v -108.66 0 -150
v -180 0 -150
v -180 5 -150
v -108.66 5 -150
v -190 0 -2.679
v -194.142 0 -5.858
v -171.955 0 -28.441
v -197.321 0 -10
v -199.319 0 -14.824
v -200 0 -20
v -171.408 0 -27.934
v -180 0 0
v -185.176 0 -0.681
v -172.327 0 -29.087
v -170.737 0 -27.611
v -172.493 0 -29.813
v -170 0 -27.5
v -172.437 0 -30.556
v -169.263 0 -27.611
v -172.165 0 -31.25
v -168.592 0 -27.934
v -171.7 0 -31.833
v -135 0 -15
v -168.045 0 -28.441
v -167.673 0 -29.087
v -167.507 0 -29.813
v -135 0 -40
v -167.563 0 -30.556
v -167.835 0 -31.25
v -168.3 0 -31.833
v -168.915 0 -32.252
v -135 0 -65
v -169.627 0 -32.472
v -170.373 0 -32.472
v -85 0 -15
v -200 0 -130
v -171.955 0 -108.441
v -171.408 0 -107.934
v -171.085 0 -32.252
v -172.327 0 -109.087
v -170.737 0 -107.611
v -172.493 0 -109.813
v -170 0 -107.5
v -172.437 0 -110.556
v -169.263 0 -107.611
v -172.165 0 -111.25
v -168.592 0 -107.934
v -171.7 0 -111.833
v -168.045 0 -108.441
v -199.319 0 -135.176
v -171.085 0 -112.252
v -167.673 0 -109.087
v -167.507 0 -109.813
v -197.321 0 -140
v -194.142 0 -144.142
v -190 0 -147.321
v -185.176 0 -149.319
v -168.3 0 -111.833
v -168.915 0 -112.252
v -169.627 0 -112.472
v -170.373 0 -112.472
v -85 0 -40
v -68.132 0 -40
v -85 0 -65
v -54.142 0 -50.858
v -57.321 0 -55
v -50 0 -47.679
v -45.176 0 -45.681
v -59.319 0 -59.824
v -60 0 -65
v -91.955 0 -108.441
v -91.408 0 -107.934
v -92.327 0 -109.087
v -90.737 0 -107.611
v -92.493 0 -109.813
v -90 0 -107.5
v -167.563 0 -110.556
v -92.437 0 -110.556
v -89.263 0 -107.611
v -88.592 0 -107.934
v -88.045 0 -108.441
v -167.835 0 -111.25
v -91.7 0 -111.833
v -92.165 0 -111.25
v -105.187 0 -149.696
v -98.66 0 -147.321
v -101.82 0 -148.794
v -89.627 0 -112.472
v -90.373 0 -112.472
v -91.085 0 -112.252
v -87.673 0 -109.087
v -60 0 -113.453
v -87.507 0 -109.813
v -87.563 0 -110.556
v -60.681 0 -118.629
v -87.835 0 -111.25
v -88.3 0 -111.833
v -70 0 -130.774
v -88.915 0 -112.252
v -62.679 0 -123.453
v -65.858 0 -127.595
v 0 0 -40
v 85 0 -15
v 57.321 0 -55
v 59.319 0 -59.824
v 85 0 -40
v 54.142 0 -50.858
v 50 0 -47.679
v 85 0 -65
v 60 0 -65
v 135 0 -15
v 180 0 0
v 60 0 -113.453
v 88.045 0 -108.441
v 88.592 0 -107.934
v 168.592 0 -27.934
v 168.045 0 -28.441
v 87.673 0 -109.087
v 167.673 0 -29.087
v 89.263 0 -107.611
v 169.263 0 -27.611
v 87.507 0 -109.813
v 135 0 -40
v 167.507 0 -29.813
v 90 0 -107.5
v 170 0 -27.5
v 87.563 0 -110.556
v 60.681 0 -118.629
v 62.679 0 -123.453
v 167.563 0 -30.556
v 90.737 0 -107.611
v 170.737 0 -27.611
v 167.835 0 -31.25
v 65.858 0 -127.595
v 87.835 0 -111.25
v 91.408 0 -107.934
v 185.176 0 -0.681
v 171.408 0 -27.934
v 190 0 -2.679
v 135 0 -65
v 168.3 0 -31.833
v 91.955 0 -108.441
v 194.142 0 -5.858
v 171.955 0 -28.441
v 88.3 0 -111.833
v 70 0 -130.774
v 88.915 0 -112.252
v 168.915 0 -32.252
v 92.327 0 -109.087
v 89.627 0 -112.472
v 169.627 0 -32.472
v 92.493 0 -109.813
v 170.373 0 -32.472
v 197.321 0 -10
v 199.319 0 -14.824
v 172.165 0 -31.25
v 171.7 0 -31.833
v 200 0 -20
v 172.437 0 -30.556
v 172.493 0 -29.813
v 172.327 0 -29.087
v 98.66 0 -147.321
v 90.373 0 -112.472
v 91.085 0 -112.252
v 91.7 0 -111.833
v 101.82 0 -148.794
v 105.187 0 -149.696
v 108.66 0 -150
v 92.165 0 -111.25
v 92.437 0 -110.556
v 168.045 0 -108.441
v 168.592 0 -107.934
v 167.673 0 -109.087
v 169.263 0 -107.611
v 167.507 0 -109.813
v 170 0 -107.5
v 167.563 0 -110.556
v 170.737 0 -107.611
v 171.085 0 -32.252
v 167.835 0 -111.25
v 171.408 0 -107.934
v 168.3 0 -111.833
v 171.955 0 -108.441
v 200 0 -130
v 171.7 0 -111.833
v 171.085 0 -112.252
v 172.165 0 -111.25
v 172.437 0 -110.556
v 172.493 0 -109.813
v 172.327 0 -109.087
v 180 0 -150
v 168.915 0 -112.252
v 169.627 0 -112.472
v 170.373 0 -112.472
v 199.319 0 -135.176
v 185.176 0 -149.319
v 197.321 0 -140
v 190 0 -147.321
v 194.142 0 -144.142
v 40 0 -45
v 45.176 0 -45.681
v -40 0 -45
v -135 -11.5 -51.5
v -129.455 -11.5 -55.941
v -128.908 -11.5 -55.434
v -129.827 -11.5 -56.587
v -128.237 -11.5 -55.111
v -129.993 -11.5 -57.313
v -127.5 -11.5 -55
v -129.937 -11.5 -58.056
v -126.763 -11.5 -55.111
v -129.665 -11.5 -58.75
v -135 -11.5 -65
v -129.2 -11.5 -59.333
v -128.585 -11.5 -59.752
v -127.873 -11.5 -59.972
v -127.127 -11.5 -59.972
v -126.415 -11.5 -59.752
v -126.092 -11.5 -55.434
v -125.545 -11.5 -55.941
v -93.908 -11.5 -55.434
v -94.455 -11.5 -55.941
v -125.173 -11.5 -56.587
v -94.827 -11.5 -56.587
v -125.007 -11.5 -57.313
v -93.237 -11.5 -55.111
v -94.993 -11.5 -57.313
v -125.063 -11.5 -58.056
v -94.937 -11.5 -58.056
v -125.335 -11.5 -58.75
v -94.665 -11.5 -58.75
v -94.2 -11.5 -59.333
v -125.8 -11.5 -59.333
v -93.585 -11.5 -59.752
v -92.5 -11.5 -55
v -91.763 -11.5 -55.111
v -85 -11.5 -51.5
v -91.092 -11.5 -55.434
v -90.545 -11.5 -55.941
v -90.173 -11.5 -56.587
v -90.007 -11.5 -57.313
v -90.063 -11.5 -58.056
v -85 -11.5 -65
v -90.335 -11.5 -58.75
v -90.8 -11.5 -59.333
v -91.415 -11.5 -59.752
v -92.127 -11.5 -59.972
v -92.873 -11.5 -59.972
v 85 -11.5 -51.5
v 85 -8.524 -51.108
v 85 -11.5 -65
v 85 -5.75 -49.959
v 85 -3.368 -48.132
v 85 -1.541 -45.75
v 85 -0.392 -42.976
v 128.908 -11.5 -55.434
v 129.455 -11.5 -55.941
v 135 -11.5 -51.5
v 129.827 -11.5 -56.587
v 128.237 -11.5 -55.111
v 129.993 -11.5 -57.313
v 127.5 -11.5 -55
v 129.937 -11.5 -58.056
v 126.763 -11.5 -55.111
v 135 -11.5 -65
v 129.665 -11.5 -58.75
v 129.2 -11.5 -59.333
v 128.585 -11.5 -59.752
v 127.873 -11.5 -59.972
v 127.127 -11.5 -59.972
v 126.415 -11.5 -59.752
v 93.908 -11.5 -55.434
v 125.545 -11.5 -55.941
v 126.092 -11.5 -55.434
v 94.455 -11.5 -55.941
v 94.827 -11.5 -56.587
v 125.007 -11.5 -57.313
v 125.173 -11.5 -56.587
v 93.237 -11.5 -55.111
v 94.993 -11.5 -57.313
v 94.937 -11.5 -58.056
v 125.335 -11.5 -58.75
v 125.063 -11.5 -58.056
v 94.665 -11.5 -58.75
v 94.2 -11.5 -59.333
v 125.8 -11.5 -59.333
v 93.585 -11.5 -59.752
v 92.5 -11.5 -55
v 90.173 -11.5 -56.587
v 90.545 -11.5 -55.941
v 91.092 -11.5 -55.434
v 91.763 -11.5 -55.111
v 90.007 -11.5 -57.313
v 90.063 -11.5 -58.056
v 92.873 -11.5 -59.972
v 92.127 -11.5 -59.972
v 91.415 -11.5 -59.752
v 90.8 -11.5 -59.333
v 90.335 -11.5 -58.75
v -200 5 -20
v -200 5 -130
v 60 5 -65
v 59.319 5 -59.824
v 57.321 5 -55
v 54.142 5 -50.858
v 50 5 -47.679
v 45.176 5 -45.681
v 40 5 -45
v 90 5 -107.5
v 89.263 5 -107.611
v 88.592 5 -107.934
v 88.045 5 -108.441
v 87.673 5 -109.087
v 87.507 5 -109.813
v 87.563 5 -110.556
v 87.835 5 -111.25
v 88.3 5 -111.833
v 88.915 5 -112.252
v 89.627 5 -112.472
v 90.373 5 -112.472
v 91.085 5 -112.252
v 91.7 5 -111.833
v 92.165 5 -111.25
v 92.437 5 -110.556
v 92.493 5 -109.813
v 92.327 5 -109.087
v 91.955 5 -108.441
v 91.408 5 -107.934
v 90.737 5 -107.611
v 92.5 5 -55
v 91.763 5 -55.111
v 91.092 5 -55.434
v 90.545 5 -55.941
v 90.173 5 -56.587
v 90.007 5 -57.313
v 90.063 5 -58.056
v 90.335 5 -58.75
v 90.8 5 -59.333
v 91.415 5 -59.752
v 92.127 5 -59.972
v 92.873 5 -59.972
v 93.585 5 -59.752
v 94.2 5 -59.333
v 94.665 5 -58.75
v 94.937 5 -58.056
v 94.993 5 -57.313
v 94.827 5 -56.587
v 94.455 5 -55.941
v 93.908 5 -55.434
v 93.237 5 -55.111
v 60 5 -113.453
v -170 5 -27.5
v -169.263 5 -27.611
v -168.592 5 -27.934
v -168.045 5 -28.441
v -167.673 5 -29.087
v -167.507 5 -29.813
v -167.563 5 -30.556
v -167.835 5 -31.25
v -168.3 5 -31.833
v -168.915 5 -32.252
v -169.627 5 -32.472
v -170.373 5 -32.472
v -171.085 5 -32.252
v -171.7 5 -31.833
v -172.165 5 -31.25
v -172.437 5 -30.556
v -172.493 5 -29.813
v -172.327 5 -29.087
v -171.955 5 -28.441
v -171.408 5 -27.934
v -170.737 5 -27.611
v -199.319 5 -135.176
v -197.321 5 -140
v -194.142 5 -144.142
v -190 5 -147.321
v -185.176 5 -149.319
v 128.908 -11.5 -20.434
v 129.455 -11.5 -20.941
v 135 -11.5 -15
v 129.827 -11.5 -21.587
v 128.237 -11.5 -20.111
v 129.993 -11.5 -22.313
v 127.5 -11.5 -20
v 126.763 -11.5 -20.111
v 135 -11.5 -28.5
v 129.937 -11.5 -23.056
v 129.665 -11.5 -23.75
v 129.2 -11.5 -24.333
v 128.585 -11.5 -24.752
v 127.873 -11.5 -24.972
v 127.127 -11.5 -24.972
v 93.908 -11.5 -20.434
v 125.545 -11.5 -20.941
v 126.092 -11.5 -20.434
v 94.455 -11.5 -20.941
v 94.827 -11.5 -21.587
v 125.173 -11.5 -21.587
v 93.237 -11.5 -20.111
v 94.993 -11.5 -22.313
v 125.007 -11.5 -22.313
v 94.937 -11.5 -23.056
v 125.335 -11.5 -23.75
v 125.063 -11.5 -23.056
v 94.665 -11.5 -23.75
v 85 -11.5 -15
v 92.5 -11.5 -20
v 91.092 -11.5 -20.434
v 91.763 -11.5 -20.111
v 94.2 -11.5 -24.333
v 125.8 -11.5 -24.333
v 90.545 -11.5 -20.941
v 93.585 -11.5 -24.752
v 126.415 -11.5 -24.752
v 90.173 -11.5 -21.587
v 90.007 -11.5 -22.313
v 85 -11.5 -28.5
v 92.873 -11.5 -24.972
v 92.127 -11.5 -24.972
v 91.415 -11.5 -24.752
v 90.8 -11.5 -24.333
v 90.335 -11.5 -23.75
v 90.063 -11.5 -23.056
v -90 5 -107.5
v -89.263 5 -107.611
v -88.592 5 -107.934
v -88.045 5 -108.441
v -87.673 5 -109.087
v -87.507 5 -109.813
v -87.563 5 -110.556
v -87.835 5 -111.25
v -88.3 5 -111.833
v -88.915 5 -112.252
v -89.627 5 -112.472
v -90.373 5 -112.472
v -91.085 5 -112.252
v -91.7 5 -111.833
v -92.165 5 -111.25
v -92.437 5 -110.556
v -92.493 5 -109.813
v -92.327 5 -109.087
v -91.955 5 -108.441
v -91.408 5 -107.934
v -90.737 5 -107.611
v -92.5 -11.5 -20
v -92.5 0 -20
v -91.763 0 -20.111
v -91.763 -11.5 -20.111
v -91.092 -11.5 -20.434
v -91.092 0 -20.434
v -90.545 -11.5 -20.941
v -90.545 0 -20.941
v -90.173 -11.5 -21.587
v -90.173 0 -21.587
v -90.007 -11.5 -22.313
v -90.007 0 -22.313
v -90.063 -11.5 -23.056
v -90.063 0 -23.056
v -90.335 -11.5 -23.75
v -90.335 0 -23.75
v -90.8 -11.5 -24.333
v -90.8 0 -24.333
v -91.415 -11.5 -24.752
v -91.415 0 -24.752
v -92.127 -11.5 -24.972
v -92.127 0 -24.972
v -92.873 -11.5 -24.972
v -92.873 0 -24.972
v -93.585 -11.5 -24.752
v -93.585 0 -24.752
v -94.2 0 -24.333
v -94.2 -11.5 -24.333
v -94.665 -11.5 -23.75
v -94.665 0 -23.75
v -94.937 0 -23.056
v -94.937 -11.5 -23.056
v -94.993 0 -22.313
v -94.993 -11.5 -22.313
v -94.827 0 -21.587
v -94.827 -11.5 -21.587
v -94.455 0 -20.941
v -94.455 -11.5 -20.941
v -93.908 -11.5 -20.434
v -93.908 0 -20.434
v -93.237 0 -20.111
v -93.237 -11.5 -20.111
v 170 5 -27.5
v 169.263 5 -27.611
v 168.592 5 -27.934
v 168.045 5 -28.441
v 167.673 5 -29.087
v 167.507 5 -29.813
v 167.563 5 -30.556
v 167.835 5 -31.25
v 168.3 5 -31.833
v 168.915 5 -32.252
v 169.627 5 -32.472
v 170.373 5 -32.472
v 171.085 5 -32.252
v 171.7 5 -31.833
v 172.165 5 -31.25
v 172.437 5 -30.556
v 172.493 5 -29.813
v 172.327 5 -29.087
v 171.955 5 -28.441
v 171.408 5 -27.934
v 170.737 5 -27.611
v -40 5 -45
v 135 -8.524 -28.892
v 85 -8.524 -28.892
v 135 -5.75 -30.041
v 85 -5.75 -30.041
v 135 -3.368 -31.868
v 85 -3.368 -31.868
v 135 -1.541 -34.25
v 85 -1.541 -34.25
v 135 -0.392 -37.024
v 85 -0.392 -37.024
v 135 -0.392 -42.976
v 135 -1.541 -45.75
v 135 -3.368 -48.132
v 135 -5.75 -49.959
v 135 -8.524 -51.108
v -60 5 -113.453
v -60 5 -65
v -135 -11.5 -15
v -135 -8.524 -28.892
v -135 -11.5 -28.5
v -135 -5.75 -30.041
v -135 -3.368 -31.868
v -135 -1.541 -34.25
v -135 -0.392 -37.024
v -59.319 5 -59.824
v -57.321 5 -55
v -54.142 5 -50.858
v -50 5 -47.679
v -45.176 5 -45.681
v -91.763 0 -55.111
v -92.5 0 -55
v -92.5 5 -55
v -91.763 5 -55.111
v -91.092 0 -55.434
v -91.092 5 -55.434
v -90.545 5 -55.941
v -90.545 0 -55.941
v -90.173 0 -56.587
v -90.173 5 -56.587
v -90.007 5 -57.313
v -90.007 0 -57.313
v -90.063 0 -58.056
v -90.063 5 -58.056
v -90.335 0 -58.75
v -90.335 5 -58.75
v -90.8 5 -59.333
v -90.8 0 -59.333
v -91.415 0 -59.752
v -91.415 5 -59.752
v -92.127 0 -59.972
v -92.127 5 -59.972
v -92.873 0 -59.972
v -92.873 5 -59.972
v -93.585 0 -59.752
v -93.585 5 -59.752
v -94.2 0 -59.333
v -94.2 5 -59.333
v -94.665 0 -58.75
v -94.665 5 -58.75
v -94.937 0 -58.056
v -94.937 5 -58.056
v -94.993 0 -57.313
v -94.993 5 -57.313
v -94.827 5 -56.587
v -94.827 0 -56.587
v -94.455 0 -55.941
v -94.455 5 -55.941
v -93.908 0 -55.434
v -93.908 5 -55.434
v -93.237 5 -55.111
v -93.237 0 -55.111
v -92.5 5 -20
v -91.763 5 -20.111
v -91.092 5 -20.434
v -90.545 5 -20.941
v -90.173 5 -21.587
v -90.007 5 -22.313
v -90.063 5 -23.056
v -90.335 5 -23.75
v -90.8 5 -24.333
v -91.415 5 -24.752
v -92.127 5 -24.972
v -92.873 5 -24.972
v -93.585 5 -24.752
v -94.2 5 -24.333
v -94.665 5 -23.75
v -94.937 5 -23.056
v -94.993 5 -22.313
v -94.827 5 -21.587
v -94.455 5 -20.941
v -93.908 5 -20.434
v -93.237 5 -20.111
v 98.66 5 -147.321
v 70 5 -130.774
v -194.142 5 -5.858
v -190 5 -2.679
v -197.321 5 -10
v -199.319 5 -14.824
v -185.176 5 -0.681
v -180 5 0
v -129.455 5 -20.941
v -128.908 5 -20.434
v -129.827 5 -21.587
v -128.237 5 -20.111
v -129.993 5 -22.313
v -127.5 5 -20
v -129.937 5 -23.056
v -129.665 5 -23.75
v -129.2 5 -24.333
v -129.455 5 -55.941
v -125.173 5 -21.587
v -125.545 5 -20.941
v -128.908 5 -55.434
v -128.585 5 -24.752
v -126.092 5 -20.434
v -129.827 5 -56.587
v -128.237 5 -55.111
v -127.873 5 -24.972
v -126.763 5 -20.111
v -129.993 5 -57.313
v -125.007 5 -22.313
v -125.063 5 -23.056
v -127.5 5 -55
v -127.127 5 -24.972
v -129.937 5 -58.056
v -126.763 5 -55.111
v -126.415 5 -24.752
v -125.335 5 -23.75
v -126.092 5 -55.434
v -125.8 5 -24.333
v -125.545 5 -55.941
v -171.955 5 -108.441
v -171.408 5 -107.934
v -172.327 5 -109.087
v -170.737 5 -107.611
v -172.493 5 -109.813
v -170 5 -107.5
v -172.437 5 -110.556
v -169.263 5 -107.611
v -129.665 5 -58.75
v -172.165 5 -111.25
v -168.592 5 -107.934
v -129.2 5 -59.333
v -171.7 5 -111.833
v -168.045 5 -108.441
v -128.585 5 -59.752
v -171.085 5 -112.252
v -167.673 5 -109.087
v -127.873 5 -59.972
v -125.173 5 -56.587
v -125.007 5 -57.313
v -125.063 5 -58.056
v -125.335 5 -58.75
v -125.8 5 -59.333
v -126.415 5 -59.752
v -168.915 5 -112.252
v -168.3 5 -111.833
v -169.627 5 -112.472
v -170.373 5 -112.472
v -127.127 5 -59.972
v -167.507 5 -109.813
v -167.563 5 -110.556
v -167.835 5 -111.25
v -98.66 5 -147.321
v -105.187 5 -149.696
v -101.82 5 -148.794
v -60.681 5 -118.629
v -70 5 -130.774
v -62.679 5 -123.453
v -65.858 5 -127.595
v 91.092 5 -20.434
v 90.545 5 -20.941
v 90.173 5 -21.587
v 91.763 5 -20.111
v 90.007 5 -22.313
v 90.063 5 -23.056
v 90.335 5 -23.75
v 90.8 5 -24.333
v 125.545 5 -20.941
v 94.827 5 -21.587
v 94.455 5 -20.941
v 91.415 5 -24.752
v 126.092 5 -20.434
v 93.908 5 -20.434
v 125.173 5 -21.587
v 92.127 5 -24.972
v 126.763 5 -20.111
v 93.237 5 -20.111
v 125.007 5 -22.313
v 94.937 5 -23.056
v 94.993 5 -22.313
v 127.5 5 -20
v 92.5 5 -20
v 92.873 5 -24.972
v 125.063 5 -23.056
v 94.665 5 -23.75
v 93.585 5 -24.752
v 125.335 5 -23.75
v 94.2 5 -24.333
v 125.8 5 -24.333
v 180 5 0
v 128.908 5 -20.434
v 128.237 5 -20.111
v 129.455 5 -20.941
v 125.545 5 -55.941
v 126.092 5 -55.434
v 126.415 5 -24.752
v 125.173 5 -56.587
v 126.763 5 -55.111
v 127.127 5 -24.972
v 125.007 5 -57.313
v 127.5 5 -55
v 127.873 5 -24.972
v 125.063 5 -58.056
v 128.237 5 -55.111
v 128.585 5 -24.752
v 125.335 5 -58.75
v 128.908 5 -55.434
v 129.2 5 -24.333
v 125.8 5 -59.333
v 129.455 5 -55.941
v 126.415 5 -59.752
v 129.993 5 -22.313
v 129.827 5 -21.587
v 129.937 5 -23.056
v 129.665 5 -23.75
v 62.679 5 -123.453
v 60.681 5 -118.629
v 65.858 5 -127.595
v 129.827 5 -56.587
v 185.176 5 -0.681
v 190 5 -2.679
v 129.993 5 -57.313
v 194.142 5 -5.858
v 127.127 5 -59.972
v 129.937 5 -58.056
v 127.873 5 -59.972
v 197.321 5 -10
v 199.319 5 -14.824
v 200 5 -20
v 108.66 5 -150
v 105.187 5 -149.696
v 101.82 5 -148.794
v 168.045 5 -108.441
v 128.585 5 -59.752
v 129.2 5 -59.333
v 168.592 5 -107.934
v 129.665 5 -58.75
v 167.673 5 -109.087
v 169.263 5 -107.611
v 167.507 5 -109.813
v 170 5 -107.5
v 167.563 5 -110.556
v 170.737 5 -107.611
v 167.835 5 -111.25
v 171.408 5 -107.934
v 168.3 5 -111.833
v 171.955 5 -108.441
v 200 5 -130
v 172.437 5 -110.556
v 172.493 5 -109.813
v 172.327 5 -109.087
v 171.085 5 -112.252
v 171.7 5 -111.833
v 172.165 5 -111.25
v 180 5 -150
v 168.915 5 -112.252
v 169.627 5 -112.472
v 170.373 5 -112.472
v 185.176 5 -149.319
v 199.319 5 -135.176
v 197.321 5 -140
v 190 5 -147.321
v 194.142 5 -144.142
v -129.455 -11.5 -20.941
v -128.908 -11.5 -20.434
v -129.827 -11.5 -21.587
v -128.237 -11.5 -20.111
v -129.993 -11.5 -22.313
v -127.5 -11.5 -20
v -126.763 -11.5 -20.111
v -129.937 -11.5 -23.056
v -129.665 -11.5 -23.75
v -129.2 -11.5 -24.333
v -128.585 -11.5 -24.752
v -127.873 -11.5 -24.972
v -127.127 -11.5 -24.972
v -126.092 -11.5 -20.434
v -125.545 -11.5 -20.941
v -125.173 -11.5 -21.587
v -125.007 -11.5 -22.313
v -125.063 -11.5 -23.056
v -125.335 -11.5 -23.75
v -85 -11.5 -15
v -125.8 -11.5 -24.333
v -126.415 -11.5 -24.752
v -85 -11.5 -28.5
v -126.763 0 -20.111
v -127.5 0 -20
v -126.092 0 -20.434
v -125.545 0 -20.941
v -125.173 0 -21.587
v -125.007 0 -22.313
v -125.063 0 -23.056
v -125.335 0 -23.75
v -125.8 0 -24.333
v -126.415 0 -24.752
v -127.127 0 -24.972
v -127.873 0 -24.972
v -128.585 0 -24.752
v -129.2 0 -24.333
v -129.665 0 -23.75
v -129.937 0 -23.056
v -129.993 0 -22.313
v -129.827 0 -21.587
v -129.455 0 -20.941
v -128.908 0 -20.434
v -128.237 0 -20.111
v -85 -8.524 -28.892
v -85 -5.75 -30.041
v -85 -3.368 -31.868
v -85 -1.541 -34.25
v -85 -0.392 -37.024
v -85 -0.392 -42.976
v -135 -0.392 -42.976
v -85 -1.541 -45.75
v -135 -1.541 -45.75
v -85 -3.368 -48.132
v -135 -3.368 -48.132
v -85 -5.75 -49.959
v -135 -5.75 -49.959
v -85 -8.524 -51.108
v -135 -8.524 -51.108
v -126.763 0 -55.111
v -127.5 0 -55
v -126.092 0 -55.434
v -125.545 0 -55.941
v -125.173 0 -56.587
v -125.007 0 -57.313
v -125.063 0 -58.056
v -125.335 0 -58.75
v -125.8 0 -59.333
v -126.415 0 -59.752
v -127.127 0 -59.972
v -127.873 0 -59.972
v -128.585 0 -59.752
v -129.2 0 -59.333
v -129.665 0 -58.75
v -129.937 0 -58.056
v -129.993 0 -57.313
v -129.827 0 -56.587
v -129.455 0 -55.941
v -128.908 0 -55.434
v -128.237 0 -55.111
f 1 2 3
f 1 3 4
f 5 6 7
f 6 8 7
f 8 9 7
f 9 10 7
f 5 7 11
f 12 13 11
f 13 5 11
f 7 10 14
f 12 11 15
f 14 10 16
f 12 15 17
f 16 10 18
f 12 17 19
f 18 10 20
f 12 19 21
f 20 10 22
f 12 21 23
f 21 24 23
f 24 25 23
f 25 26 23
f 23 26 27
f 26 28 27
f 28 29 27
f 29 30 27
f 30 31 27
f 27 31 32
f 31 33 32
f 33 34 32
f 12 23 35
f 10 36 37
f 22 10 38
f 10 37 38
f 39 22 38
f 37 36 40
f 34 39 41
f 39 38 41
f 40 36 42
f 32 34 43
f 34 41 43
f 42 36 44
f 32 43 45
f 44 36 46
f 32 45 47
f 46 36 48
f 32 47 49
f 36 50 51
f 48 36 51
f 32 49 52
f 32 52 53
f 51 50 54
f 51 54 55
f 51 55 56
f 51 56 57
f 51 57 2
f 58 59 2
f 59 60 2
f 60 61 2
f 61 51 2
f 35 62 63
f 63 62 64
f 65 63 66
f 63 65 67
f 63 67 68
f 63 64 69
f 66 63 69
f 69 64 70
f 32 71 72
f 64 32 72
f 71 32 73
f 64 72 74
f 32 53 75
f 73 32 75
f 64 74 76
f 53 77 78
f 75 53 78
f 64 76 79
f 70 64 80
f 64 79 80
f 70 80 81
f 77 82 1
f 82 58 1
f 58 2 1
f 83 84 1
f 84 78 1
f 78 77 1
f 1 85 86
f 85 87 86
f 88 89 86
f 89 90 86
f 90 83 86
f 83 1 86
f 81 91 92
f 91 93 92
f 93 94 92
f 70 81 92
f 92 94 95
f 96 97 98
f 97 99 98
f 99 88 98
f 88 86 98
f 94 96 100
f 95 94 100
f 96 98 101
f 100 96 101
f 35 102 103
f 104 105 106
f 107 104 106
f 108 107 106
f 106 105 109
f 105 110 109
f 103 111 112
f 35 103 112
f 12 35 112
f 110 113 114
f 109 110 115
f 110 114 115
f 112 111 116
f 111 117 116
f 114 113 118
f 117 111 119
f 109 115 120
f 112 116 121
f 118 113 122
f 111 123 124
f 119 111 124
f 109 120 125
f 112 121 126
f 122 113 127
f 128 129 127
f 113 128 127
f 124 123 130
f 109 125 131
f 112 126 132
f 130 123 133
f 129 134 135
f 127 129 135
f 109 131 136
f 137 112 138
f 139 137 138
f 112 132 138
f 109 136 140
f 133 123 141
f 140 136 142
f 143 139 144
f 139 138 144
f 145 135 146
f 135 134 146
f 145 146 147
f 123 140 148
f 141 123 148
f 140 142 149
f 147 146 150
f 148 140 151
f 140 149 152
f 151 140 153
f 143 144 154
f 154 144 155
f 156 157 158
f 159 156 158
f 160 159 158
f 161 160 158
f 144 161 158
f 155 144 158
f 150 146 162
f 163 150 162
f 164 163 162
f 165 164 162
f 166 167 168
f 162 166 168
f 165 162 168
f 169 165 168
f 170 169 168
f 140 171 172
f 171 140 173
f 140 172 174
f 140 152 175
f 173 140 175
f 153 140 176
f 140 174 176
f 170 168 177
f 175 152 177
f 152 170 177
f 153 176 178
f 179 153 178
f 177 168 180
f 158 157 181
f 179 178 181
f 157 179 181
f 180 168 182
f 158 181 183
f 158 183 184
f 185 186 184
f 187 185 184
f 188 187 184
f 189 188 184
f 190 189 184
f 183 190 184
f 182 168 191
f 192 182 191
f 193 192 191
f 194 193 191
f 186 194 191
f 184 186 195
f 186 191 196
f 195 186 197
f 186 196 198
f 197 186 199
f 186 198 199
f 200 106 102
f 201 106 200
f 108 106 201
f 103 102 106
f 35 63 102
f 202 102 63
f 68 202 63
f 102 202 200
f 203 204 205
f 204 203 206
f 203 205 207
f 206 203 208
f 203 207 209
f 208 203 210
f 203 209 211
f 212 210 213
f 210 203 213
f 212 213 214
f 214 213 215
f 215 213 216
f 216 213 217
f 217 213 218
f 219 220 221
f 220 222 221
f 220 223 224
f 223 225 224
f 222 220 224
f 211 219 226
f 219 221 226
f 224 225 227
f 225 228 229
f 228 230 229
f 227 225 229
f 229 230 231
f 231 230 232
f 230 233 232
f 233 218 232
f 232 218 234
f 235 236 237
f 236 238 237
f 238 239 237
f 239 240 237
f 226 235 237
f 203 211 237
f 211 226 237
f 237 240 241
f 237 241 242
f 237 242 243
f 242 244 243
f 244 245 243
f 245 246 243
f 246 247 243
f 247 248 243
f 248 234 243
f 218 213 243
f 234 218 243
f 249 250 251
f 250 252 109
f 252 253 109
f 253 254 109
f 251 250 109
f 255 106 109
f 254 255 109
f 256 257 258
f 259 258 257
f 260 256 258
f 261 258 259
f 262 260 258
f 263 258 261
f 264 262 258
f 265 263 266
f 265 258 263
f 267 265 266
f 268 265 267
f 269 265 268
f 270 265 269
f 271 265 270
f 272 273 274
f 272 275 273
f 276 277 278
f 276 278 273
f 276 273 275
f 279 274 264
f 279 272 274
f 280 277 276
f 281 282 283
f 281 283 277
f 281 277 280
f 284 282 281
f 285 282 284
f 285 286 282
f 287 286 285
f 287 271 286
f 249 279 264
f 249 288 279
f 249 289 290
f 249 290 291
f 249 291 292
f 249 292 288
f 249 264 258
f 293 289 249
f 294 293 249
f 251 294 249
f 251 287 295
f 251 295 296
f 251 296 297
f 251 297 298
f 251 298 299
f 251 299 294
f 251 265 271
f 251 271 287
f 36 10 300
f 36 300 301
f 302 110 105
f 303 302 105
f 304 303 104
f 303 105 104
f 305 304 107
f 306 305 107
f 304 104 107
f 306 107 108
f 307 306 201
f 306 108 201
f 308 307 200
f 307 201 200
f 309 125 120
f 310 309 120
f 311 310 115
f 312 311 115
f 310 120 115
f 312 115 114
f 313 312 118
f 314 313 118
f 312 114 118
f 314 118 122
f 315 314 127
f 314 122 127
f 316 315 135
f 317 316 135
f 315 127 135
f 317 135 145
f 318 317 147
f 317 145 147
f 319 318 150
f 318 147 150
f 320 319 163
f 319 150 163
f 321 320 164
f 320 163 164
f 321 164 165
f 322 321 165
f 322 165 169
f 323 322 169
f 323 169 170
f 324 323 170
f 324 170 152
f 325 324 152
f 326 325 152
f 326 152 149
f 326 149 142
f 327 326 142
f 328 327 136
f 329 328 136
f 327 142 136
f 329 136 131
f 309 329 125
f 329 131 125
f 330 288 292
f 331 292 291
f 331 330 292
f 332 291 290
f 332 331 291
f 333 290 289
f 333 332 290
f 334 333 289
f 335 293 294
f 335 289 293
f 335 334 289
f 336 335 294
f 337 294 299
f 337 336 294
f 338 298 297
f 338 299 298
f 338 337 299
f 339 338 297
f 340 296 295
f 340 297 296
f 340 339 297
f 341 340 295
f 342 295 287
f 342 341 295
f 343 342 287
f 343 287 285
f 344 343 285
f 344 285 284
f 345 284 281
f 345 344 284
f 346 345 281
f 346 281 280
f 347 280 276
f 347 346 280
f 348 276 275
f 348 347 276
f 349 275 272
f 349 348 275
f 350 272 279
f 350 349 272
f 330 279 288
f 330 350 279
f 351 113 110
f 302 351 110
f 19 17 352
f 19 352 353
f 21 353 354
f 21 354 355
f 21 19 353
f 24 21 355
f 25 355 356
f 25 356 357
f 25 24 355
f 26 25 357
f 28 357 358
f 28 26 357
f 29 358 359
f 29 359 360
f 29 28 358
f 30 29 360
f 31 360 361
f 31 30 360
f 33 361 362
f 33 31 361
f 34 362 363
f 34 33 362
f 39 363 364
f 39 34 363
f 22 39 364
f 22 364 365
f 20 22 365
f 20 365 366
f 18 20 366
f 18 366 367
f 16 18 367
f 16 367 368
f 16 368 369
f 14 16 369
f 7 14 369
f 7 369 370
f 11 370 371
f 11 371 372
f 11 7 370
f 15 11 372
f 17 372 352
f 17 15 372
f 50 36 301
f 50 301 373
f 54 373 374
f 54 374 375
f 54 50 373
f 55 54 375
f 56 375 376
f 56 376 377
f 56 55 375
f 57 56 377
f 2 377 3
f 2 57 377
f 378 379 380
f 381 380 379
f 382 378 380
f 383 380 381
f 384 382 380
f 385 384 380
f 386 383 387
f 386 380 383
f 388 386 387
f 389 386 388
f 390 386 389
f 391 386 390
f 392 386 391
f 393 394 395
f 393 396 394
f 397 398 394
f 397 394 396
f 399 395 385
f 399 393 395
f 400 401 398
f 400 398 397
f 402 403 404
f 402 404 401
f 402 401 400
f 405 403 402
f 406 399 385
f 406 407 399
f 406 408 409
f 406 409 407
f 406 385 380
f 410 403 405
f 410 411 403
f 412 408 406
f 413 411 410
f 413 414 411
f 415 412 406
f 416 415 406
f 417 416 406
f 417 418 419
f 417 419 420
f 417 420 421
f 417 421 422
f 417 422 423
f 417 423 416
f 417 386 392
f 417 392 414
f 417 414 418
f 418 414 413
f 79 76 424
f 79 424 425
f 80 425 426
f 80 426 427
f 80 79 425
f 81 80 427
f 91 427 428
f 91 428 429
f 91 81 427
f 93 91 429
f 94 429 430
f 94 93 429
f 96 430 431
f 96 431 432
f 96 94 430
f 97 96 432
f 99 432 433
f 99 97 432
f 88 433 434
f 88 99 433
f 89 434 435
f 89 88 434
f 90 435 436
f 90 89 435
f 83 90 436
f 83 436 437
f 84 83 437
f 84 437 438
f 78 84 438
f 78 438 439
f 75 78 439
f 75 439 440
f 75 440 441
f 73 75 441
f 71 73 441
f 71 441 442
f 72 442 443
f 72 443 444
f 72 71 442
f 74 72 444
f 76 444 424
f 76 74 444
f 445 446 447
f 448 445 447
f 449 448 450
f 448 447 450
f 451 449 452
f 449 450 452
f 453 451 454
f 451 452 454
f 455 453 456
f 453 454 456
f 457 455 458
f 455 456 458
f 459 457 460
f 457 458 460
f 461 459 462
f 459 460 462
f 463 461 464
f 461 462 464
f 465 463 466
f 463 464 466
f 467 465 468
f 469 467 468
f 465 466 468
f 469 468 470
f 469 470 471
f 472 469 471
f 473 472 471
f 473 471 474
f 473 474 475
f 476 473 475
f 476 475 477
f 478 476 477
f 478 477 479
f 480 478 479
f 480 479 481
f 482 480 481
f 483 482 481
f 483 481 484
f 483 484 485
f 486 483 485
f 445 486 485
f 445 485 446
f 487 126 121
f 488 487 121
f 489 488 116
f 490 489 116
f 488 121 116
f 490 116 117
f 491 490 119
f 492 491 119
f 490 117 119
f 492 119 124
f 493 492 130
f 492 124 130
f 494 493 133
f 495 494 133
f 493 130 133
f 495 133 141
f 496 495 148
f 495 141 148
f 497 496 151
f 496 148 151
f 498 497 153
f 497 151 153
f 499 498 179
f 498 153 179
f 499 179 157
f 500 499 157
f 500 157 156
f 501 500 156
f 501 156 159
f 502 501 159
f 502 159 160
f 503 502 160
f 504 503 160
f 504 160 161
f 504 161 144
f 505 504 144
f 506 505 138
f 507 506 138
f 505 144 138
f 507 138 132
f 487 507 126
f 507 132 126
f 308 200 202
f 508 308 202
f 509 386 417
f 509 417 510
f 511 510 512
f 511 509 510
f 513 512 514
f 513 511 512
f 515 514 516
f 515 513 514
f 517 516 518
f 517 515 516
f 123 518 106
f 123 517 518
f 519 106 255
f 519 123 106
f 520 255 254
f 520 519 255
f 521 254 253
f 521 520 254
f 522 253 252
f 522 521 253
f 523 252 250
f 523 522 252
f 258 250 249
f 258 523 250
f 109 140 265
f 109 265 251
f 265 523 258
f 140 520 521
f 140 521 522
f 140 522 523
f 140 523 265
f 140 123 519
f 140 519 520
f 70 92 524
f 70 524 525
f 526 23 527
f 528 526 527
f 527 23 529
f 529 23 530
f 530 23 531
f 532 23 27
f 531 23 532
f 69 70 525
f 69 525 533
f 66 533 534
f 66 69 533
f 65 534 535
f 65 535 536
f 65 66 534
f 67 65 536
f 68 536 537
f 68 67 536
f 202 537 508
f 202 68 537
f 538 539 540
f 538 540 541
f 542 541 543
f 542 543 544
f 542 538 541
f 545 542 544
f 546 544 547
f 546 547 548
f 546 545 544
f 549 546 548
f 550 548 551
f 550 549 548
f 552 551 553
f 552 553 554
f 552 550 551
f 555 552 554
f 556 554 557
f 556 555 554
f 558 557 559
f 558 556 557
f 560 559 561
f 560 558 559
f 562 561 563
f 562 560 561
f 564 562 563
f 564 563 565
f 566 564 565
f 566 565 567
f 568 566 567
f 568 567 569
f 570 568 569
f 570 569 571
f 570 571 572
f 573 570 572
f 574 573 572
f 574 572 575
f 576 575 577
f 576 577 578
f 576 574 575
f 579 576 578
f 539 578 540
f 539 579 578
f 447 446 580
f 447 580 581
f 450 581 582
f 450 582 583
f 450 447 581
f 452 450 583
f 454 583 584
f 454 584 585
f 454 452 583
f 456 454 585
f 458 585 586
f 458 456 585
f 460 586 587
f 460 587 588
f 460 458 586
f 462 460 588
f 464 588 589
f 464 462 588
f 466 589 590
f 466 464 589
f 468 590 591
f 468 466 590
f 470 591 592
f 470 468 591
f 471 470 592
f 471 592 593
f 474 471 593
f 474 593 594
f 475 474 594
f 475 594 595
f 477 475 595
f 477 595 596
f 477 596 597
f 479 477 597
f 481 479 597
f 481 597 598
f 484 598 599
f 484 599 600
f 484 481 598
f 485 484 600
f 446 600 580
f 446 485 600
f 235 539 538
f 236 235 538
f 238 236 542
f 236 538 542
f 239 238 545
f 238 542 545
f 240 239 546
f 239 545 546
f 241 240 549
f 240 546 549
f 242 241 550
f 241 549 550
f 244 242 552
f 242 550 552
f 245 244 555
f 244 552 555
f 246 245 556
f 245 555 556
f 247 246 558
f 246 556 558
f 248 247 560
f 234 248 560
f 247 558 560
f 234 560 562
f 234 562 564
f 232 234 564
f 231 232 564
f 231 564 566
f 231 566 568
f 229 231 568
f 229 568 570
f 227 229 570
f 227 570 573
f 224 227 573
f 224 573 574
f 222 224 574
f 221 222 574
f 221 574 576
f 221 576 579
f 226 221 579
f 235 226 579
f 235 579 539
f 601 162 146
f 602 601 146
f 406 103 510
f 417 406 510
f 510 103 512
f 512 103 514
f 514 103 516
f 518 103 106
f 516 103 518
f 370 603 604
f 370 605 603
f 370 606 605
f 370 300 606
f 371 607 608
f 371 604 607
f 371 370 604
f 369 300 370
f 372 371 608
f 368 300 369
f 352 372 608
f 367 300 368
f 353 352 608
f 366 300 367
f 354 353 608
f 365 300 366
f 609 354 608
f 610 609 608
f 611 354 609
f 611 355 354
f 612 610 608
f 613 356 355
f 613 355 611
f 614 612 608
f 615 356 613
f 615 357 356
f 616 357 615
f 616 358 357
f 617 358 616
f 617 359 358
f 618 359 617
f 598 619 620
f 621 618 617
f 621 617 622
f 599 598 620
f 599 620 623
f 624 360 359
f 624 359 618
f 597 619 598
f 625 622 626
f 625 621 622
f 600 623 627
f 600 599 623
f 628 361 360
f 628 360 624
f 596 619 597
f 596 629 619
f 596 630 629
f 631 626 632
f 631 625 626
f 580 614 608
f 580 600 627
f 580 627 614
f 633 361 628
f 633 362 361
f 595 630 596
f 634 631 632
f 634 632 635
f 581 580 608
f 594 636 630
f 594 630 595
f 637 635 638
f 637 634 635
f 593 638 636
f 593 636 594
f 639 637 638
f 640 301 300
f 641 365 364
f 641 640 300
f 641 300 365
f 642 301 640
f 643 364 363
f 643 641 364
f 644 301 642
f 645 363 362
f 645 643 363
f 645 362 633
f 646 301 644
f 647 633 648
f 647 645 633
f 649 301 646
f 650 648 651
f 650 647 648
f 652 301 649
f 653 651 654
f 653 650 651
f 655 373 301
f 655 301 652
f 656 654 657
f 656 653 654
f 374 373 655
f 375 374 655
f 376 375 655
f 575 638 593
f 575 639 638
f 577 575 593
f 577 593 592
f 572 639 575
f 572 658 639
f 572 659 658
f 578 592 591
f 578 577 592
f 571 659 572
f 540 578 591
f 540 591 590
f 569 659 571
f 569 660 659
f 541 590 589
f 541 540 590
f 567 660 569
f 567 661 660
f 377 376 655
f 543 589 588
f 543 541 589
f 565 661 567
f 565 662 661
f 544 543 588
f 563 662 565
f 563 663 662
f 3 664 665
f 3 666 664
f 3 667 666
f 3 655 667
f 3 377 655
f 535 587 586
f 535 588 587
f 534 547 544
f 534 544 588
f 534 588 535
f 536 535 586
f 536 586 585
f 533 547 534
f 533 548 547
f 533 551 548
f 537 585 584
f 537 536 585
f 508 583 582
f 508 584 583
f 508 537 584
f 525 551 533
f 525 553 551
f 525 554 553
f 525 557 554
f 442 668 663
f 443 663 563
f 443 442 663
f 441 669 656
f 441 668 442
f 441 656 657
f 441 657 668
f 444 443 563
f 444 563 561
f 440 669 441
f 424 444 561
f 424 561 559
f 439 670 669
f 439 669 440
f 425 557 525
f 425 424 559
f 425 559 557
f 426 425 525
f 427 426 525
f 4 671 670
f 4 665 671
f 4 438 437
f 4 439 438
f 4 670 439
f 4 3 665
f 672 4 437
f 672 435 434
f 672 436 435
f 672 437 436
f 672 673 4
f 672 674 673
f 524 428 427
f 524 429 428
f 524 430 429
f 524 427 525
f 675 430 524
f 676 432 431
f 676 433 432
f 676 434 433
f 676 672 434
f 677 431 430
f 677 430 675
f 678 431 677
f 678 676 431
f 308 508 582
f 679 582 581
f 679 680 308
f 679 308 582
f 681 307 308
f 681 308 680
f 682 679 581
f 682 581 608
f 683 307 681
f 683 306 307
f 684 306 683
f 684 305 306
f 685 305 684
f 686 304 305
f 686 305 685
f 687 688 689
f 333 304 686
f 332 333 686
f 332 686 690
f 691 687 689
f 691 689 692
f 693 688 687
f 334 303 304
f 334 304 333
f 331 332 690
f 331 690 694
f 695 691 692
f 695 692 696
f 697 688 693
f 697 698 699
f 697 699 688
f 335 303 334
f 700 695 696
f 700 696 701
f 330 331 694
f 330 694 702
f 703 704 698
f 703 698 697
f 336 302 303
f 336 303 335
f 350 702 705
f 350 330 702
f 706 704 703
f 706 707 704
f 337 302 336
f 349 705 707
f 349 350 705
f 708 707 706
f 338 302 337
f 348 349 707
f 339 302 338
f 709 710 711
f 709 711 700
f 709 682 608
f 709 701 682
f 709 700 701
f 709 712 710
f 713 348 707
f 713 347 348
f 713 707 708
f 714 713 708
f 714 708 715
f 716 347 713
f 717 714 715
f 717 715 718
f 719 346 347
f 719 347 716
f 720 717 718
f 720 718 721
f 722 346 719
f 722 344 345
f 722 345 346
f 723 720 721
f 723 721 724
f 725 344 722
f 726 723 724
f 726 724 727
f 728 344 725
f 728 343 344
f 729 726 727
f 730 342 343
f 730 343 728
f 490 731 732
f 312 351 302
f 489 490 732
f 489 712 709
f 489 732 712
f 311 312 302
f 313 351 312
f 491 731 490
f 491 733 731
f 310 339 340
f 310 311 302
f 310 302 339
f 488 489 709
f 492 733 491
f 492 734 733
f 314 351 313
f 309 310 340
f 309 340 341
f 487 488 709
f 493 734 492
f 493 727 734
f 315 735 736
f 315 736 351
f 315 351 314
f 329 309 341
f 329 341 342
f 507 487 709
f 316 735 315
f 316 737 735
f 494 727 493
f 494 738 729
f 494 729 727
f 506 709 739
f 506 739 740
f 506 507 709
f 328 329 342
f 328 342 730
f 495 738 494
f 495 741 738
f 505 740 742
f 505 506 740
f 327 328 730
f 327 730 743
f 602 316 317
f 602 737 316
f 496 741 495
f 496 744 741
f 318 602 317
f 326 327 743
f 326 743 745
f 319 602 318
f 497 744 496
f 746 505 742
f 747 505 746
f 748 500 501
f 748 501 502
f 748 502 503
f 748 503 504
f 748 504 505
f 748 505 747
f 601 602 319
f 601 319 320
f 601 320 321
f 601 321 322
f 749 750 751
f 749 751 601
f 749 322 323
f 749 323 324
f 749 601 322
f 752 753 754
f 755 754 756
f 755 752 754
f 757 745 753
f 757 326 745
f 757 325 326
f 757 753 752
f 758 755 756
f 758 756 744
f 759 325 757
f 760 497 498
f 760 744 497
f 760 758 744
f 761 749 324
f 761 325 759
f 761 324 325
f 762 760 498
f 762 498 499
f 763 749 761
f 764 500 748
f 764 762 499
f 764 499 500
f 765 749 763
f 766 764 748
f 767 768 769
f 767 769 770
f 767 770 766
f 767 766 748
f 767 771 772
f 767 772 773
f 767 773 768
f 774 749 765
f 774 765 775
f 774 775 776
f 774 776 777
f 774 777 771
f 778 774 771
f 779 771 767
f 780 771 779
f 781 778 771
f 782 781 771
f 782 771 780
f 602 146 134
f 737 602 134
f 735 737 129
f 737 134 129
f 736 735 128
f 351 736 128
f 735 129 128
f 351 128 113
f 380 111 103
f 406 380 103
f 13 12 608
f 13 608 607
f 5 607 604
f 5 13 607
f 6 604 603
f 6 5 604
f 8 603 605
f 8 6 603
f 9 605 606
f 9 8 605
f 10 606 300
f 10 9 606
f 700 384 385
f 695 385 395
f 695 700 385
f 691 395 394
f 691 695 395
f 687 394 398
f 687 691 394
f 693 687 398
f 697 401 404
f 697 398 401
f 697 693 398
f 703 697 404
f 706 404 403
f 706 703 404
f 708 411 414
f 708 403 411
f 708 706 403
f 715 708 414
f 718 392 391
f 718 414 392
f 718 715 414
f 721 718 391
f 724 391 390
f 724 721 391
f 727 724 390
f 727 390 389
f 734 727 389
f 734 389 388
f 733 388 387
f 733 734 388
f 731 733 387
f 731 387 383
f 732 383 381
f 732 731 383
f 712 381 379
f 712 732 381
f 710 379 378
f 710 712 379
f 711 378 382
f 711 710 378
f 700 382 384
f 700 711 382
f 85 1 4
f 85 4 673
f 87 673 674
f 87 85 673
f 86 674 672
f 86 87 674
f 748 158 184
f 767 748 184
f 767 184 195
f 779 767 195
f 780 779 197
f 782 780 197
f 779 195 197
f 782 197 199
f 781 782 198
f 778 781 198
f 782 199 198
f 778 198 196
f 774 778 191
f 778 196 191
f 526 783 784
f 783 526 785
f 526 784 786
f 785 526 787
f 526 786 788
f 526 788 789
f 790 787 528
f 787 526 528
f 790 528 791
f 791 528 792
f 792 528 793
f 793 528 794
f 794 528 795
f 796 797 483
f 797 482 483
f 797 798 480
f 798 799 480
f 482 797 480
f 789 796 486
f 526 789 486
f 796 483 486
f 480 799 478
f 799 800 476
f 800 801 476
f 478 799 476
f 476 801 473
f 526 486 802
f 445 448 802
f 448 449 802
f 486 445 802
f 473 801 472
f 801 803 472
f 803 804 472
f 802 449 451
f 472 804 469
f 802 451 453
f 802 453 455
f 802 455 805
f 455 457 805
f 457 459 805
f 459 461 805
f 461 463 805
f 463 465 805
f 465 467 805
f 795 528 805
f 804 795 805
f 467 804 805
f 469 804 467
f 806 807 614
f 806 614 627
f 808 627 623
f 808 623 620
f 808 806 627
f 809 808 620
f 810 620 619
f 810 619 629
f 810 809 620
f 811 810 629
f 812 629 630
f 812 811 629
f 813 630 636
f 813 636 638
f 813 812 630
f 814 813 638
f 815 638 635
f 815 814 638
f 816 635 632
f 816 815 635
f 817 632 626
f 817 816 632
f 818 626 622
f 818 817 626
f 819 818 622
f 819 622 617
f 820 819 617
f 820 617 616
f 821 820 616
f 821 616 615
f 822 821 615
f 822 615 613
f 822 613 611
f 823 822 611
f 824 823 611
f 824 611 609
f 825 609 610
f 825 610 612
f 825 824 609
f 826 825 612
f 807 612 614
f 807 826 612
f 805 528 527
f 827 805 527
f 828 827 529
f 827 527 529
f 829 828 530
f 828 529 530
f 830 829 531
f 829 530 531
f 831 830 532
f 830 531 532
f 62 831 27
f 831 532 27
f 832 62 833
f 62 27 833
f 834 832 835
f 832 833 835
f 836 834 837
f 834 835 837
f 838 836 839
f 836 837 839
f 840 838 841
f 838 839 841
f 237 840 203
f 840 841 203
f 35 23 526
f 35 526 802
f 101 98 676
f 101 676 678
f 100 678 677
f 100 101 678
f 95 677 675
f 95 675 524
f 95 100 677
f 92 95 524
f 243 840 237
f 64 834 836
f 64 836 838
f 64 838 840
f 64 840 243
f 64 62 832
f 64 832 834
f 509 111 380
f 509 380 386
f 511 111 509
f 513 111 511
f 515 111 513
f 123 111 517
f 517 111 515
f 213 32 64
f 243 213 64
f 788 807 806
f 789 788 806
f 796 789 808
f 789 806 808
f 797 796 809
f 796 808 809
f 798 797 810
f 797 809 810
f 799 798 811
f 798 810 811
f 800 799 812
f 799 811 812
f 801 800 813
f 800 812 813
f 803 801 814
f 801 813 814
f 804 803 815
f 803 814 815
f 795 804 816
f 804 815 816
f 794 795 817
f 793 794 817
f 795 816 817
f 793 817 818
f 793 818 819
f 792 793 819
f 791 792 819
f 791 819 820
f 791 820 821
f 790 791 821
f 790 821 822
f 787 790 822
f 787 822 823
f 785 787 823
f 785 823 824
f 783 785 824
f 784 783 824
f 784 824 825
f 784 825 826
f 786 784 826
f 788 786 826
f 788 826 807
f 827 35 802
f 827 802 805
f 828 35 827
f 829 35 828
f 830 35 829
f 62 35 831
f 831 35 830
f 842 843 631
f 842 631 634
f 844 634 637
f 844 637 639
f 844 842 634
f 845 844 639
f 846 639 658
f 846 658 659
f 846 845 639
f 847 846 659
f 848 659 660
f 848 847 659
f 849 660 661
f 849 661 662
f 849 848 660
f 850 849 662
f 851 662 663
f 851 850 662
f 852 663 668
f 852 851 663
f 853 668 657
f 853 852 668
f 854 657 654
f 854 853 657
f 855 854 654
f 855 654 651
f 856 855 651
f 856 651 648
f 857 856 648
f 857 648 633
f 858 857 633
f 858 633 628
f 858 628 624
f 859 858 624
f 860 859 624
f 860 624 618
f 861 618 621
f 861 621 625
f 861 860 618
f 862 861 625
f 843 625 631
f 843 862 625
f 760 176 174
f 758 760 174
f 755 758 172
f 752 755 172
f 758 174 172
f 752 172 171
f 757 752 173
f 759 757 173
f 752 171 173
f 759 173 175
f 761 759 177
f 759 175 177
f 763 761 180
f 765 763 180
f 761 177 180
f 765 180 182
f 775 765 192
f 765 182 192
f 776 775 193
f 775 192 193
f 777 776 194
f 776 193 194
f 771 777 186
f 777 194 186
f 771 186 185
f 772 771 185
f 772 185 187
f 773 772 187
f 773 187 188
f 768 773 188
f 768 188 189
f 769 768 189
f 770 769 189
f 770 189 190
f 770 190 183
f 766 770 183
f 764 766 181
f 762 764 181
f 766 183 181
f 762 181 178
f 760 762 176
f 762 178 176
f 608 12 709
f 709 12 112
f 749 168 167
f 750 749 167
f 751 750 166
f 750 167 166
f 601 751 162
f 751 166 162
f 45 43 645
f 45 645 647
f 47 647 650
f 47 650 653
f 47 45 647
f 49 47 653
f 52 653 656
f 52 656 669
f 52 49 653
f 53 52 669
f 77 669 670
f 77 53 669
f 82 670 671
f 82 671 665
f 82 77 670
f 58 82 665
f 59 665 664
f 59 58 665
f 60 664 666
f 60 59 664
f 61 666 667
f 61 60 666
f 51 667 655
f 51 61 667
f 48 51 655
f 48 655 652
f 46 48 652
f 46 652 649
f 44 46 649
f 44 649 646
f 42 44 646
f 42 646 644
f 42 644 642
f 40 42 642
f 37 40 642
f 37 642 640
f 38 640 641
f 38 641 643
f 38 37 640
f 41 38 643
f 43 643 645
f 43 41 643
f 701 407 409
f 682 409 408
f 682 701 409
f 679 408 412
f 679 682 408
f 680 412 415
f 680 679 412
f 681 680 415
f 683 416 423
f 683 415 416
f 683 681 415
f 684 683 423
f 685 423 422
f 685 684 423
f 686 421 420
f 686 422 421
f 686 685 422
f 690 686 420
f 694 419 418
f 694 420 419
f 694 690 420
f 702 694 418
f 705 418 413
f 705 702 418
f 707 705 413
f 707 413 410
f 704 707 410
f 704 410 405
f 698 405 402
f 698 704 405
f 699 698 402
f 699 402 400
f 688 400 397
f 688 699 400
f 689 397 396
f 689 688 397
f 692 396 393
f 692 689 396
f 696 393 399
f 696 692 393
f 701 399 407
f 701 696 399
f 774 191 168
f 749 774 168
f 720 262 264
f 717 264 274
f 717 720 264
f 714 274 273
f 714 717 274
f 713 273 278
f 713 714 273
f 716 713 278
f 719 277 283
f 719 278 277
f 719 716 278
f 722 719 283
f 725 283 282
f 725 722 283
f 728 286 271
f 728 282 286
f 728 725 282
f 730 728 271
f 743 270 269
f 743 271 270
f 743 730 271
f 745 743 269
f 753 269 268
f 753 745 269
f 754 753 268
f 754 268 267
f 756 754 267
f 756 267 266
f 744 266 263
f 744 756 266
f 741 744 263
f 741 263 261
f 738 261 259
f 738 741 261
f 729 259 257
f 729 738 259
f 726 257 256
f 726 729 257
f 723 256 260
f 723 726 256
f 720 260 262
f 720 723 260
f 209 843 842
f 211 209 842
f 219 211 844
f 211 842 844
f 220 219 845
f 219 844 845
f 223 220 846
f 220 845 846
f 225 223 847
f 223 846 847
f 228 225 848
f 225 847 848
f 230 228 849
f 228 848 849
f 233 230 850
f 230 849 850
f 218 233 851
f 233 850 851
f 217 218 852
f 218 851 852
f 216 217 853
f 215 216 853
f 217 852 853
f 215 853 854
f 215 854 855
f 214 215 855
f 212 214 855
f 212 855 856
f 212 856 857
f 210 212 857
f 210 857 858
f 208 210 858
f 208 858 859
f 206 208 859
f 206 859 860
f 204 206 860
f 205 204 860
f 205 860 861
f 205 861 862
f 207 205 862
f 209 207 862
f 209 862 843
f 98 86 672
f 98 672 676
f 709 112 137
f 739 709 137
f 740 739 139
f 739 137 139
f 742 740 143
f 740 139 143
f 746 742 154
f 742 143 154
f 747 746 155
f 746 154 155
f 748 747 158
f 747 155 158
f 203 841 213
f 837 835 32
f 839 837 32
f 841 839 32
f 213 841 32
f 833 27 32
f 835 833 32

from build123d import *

# Parameters (mm, degrees)
SKETCH_1_R          = 2.5
EXTRUDE_1_DEPTH     = 5
SKETCH_2_W          = 50
SKETCH_2_H          = 50
EXTRUDE_2_DEPTH     = 11.5
SKETCH_3_R          = 11.5
CUT_EXTRUDE_1_DEPTH = 203.131763956
SKETCH_1_7_R        = 2.5
CUT_EXTRUDE_3_DEPTH = 251.264360227


with BuildPart() as part:
    # 草图1 → 凸台-拉伸1 (new body)
    with BuildSketch(Plane(origin=(0, 0, 0), x_dir=(1, 0, 0), z_dir=(0, 1, 0))):
        with BuildLine():
            Line((0, 0), (-180, 0))
            ThreePointArc((-180, 0), (-194.142135624, 5.857864376), (-200, 20))
            Line((-200, 20), (-200, 130))
            ThreePointArc((-200, 130), (-194.142135624, 144.142135624), (-180, 150))
            Line((-180, 150), (-108.660254038, 150))
            ThreePointArc((-108.660254038, 150), (-103.483873136, 149.318516526), (-98.660254038, 147.320508076))
            Line((-98.660254038, 147.320508076), (-70, 130.773502692))
            ThreePointArc((-70, 130.773502692), (-62.679491924, 123.452994616), (-60, 113.452994616))
            Line((-60, 113.452994616), (-60, 65))
            ThreePointArc((-60, 65), (-54.142135624, 50.857864376), (-40, 45))
            Line((-40, 45), (0, 45))
            Line((0, 45), (0, 0))
        make_face()
        with Locations((-127.5, 57.5)):
            Circle(SKETCH_1_R, mode=Mode.SUBTRACT)
        with Locations((-92.5, 57.5)):
            Circle(SKETCH_1_R, mode=Mode.SUBTRACT)
        with Locations((-127.5, 22.5)):
            Circle(SKETCH_1_R, mode=Mode.SUBTRACT)
        with Locations((-92.5, 22.5)):
            Circle(SKETCH_1_R, mode=Mode.SUBTRACT)
        with Locations((-170, 110)):
            Circle(SKETCH_1_R, mode=Mode.SUBTRACT)
        with Locations((-90, 110)):
            Circle(SKETCH_1_R, mode=Mode.SUBTRACT)
        with Locations((-170, 30)):
            Circle(SKETCH_1_R, mode=Mode.SUBTRACT)
    extrude_1 = extrude(amount=EXTRUDE_1_DEPTH)

    # 草图2 → 凸台-拉伸2 (add)
    with BuildSketch(Plane(origin=(0, 0, 0), x_dir=(1, 0, 0), z_dir=(0, 1, 0))):
        with Locations((-110, 40)):
            Rectangle(SKETCH_2_W, SKETCH_2_H)
    extrude_2 = extrude(amount=-EXTRUDE_2_DEPTH)

    # 草图3 → 切除-拉伸1 (cut, through all)
    with BuildSketch(Plane.ZY.offset(135)):
        with Locations((-40, -11.5)):
            Circle(SKETCH_3_R)
    cut_extrude_1 = extrude(amount=-CUT_EXTRUDE_1_DEPTH, mode=Mode.SUBTRACT)

    # 草图1<7> → 切除-拉伸3 (cut, through all)
    with BuildSketch(Plane(origin=(0, 0, 0), x_dir=(1, 0, 0), z_dir=(0, 1, 0))):
        with Locations((-127.5, 57.5)):
            Circle(SKETCH_1_7_R)
        with Locations((-92.5, 57.5)):
            Circle(SKETCH_1_7_R)
        with Locations((-127.5, 22.5)):
            Circle(SKETCH_1_7_R)
        with Locations((-92.5, 22.5)):
            Circle(SKETCH_1_7_R)
    cut_extrude_3 = extrude(amount=-CUT_EXTRUDE_3_DEPTH, mode=Mode.SUBTRACT)

    # 镜向1: 凸台-拉伸1, 凸台-拉伸2, 切除-拉伸1, 切除-拉伸3 across plane
    add(extrude_1.mirror(Plane(origin=(0, 5, -45), x_dir=(0, 0, 1), z_dir=(-1, 0, 0))))
    add(extrude_2.mirror(Plane(origin=(0, 5, -45), x_dir=(0, 0, 1), z_dir=(-1, 0, 0))))
    add(cut_extrude_1.mirror(Plane(origin=(0, 5, -45), x_dir=(0, 0, 1), z_dir=(-1, 0, 0))), mode=Mode.SUBTRACT)
    add(cut_extrude_3.mirror(Plane(origin=(0, 5, -45), x_dir=(0, 0, 1), z_dir=(-1, 0, 0))), mode=Mode.SUBTRACT)


solid = part.part
